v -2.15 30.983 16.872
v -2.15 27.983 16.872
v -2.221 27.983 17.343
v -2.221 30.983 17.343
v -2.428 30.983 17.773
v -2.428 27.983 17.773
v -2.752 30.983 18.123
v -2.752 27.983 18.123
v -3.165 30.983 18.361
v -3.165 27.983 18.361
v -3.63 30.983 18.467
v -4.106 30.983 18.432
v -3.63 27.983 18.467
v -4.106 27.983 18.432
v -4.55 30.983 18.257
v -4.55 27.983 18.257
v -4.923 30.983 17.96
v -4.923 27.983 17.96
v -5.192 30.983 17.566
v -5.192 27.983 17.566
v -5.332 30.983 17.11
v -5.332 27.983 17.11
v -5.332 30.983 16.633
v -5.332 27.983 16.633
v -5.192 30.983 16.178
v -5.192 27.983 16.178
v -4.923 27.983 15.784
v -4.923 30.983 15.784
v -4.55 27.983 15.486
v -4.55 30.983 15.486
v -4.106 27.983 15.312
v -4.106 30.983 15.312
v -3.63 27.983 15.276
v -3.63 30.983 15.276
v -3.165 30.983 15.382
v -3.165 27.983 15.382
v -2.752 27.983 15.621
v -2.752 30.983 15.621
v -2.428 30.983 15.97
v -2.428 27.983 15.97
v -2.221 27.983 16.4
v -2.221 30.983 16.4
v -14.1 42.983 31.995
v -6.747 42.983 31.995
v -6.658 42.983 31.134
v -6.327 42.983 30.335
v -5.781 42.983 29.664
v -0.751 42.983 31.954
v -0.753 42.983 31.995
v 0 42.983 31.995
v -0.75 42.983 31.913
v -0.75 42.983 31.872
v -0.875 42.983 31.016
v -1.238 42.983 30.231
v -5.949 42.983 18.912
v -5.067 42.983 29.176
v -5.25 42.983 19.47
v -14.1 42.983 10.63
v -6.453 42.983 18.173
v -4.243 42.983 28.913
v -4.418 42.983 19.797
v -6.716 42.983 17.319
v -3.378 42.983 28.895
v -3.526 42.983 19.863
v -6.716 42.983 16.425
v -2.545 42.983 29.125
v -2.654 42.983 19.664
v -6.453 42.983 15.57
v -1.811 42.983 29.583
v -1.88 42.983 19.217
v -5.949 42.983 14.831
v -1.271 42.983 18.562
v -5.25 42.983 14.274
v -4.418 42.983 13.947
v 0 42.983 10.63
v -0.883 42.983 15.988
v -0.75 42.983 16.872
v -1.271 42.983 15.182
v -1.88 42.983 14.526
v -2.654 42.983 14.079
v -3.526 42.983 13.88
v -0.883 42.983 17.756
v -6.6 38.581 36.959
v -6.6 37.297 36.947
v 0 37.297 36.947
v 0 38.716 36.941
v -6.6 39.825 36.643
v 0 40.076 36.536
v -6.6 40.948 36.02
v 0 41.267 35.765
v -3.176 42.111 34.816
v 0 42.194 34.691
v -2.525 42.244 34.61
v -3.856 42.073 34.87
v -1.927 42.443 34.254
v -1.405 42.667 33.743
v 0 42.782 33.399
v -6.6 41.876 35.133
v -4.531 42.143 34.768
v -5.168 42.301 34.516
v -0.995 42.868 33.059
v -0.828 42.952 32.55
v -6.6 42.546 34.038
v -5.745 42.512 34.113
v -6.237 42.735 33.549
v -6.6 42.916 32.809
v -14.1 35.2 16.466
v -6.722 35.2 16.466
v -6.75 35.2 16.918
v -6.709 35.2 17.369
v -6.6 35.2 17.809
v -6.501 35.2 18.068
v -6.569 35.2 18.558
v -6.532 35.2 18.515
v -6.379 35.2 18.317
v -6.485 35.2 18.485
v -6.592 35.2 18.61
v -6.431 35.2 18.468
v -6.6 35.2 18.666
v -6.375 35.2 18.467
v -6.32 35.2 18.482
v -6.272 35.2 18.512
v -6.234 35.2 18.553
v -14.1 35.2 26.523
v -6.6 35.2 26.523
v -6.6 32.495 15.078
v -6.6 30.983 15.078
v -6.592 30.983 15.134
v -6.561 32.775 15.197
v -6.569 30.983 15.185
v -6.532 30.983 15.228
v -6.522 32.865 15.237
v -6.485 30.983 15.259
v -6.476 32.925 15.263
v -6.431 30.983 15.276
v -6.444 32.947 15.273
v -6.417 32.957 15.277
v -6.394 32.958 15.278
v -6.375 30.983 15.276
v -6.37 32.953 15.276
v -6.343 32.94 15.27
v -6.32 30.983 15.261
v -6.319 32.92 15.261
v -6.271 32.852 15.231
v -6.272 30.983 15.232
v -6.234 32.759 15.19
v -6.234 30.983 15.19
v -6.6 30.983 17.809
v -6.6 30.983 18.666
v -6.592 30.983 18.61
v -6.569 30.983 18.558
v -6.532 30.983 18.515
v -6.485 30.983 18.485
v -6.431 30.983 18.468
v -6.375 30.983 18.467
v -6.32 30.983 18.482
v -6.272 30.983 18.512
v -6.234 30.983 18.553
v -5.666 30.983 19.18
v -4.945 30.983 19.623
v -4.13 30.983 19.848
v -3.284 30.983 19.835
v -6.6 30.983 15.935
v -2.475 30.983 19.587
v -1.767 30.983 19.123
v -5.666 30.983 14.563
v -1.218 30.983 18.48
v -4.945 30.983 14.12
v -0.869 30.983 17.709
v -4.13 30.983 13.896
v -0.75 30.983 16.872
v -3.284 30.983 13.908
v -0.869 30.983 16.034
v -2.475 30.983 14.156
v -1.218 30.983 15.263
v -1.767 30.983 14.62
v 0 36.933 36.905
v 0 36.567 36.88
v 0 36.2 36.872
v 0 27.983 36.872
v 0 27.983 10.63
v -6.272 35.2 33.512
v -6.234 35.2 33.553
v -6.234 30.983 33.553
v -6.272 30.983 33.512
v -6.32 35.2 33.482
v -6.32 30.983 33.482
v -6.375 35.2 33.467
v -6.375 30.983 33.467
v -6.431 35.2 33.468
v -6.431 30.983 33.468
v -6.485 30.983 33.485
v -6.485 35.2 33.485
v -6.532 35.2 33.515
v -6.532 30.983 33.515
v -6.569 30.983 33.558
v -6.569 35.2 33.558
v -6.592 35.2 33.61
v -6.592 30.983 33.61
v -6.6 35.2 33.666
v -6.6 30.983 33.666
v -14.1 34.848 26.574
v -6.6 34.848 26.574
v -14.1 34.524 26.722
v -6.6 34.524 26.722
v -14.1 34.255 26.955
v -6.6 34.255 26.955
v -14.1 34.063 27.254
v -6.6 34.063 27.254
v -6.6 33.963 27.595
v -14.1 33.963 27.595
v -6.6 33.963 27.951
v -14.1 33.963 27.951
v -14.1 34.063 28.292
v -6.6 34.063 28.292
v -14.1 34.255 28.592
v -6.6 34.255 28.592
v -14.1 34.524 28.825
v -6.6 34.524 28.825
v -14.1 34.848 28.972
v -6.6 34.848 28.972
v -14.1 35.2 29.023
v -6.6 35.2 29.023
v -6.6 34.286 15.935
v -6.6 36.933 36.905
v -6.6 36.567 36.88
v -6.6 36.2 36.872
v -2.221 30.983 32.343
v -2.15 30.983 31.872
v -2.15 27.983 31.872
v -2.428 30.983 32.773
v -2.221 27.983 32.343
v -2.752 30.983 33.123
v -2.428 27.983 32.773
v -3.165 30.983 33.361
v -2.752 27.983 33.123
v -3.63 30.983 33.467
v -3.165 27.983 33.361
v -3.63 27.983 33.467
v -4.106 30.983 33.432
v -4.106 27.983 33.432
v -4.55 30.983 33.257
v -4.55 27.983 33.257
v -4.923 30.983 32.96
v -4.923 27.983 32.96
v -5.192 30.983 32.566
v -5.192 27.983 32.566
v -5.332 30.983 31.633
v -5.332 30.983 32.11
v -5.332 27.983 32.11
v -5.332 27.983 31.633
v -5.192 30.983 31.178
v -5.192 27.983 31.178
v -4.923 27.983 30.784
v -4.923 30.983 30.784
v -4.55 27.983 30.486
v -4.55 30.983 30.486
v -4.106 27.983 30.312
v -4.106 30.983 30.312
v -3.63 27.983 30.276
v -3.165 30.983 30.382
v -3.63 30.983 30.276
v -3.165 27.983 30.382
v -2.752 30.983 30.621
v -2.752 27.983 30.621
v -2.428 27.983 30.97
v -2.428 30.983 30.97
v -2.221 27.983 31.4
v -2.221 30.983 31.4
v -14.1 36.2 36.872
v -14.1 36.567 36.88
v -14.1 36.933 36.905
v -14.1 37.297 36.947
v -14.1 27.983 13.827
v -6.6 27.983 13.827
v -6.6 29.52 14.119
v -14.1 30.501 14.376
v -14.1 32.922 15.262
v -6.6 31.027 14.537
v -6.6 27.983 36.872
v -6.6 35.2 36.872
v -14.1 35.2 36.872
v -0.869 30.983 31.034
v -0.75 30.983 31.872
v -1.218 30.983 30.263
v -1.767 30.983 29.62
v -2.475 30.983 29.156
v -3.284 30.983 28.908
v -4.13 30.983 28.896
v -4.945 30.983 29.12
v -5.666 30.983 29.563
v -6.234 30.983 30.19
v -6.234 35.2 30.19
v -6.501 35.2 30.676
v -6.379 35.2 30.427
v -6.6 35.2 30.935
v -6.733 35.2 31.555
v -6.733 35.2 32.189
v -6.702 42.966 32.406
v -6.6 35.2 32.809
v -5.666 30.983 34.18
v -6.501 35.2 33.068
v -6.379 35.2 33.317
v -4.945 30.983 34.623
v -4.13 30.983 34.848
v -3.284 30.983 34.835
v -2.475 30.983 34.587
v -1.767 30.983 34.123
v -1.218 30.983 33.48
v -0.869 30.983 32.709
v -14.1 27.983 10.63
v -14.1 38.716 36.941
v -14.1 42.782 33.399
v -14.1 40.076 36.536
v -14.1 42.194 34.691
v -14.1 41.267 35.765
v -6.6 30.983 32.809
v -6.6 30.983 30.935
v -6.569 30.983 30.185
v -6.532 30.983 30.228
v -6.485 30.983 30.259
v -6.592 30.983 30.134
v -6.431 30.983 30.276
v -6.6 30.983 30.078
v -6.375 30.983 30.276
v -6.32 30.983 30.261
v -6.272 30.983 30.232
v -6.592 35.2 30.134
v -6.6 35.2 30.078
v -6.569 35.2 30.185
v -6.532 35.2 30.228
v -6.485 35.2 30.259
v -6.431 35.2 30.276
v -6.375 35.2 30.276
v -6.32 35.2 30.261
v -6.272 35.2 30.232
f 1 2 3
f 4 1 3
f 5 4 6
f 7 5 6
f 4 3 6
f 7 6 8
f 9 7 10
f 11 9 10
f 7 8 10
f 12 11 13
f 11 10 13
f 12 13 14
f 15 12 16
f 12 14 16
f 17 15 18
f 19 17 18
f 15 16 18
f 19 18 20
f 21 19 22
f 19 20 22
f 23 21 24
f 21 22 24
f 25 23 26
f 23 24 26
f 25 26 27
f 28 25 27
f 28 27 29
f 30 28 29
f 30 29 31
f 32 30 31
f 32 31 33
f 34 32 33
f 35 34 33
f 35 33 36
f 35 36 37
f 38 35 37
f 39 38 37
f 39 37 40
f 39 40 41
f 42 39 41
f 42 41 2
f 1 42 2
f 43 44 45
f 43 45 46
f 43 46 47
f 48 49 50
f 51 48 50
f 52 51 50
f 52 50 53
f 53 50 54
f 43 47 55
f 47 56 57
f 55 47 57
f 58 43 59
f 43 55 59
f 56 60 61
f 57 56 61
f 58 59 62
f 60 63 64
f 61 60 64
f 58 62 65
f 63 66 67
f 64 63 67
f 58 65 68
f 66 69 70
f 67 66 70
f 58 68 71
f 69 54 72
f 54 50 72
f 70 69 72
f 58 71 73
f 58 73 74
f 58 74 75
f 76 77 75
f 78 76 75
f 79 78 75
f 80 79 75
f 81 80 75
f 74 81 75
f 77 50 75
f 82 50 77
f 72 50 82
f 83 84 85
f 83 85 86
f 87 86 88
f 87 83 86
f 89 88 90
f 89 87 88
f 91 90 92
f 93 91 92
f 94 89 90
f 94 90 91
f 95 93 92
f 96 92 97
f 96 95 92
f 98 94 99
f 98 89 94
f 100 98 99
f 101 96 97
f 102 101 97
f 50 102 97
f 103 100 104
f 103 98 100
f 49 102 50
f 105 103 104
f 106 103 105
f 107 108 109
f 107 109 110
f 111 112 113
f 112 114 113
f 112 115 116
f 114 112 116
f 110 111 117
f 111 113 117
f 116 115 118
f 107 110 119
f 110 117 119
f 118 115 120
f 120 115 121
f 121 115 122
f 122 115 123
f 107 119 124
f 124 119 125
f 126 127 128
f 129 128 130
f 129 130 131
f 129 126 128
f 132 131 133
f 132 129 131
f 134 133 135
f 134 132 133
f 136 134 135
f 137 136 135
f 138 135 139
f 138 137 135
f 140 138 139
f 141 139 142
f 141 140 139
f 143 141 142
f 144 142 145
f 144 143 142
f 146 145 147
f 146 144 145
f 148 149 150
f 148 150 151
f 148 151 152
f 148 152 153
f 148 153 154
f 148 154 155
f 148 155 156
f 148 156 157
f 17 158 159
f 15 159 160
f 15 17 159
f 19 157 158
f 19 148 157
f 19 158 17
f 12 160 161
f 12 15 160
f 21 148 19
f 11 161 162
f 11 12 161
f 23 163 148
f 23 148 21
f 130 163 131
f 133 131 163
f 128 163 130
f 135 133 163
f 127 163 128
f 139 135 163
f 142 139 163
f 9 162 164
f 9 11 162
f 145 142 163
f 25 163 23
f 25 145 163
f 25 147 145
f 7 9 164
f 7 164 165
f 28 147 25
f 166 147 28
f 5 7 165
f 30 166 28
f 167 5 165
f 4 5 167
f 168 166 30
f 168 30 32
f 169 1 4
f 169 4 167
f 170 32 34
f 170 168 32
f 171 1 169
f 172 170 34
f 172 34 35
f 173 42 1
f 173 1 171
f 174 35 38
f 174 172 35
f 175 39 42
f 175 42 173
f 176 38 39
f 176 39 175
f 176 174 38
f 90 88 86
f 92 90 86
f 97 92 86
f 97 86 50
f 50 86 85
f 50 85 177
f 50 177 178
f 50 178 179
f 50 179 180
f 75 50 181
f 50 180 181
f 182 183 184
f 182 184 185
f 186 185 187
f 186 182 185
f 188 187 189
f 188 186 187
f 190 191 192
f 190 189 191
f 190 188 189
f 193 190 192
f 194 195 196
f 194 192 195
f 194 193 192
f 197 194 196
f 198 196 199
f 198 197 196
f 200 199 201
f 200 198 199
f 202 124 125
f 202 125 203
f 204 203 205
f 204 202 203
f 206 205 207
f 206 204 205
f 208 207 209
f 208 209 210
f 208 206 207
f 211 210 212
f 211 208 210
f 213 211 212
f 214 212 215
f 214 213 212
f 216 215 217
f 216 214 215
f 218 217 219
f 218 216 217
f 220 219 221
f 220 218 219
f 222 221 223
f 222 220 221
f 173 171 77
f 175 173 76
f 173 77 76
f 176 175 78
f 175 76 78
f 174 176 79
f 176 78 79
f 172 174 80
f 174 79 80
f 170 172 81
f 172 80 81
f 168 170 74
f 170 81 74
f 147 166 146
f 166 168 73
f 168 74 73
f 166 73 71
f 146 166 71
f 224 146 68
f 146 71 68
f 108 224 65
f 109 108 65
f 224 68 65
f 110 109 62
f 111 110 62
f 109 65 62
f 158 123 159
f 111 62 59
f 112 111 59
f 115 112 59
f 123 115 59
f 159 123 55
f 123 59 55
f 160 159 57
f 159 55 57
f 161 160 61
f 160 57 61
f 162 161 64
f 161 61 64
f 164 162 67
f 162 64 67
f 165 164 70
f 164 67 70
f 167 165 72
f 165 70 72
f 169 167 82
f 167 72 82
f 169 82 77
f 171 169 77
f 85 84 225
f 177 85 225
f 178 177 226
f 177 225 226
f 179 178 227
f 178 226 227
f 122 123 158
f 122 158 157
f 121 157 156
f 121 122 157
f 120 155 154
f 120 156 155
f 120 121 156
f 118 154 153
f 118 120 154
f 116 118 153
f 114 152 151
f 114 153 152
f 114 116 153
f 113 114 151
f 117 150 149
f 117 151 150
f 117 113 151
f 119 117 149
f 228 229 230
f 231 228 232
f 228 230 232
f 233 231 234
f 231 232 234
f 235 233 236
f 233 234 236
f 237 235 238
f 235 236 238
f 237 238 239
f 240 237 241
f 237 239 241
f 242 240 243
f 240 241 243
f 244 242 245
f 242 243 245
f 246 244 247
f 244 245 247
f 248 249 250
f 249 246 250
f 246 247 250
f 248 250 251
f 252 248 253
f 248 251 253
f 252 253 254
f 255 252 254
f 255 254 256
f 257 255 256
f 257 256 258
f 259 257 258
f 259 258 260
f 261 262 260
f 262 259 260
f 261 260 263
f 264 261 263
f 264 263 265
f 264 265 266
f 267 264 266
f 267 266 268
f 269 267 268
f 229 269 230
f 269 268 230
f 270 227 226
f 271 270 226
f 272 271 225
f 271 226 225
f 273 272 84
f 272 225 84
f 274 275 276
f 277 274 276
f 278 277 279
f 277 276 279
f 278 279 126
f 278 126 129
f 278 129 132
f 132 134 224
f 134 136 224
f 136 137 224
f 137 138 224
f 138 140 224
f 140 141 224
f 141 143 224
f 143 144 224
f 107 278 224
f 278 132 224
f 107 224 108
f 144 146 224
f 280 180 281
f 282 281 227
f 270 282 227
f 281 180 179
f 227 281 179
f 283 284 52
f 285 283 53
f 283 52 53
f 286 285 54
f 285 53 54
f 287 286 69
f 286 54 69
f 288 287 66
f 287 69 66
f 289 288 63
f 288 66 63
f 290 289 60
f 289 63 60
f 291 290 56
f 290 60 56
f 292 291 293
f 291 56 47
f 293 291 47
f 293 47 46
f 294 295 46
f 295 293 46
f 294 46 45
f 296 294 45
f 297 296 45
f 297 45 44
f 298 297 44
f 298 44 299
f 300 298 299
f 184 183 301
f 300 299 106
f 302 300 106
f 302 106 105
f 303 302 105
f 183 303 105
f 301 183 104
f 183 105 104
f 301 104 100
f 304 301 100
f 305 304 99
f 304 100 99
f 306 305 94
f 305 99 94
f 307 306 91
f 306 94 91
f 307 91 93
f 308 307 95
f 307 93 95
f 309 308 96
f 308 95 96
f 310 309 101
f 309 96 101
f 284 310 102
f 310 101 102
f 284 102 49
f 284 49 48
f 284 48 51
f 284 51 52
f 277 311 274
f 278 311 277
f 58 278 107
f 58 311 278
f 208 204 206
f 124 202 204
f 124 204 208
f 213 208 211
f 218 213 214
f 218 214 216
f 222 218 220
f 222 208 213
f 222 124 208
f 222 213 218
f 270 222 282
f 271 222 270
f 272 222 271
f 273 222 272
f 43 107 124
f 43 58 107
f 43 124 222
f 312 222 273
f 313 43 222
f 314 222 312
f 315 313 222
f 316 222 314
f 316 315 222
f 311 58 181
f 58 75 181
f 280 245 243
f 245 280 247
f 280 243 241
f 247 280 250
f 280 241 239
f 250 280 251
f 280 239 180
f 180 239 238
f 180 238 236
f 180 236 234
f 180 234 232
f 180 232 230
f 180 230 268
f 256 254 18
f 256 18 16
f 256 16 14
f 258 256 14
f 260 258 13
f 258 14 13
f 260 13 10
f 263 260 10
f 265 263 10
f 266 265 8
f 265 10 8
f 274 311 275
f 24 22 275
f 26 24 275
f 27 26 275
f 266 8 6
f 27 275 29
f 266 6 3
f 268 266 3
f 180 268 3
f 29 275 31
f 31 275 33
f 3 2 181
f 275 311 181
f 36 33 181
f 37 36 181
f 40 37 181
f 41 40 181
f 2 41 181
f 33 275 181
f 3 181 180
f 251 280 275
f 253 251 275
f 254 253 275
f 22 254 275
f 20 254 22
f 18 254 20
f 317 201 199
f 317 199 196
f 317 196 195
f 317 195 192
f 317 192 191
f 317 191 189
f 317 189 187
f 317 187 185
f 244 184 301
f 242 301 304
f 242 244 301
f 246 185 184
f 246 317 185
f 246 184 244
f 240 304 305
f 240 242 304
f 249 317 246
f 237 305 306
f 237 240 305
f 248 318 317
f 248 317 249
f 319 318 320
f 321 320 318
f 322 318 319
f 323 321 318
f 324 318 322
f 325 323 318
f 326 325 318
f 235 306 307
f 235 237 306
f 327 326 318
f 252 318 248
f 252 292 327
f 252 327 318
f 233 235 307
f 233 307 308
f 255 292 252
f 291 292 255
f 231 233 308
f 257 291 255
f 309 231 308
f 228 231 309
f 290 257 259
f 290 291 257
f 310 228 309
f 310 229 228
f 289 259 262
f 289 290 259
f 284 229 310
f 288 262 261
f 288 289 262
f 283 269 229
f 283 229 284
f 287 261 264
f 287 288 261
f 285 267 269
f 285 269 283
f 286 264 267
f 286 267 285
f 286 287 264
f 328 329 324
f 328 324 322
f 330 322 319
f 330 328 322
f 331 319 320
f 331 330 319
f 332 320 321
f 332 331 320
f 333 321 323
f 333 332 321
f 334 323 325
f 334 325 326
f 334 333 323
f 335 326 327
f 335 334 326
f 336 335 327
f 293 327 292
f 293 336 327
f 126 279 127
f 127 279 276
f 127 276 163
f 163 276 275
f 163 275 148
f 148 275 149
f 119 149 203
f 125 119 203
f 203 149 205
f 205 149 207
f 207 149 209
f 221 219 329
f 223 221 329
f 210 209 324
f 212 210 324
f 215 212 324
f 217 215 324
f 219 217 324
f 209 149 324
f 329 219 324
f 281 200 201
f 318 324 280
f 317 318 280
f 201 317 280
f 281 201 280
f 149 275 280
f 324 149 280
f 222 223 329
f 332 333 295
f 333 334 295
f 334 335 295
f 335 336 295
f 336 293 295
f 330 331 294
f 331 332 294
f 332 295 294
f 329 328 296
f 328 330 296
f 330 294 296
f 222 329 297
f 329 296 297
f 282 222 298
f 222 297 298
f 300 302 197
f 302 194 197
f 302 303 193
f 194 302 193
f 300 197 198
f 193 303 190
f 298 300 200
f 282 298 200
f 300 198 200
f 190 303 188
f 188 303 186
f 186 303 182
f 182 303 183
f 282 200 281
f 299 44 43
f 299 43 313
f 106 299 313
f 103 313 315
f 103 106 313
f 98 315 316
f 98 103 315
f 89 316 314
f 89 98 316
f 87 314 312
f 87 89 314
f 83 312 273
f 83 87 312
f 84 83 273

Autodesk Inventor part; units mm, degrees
ref_plane "YZ Plane" through (0, 0, 0) normal (1, 0, 0) x (0, 1, 0)
ref_plane "XZ Plane" through (0, 0, 0) normal (0, 1, 0) x (-1, 0, 0)
sketch "スケッチ1" plane through (0, 0, 0) normal (1, 0, 0) x (0, 1, 0)
  circle A0 centre (10, 5.37) radius 1.6
  circle A1 centre (10, -5.37) radius 1.6
  circle A2 centre (-10, -5.37) radius 1.6
  circle A3 centre (-10, 5.37) radius 1.6
  line L0 (-19.6, 0) -> (19.6, 0) projected
  line L1 (0, -13.118) -> (0, 13.118) projected
  line L2 (14, 9.37) -> (-14, 9.37)
  line L3 (-14, 9.37) -> (-14, -9.37)
  line L4 (-14, -9.37) -> (14, -9.37)
  line L5 (14, -9.37) -> (14, 9.37)
  point P0 (0, 0)
  dimension "d0" = 3.2
  dimension "d1" = 20
  dimension "d2" = 10.74
  dimension "d3" = 4
  dimension "d4" = 4
extrude "押し出し1" add sketch "スケッチ1" against normal blind 2
sketch "スケッチ2" plane through (0, 0, 0) normal (1, 0, 0) x (0, 0, -1)
  line L0 (9.37, 15.2) -> (-40.63, 15.2)
  line L1 (-40.63, 15.2) -> (-40.63, 0.2)
  line L2 (-40.63, 0.2) -> (9.37, 0.2)
  line L3 (9.37, 0.2) -> (9.37, 15.2)
  line L4 (9.37, -14) -> (9.37, 14) projected
  line L5 (9.37, 14) -> (-9.37, 14) projected
  circle A0 centre (-5.37, 10) radius 1.6 projected
  circle A1 centre (5.37, 10) radius 1.6 projected
  point P0 (0, 0)
  dimension "d7" = 1.2
  dimension "d8" = 50
  dimension "d9" = 15
extrude "押し出し2" add sketch "スケッチ2" against normal blind 6.6
sketch "スケッチ3" plane through (0, 15.2, 40.63) normal (0, 1, 0) x (1, 0, 0)
  line L0 (-6.6, 50) -> (-6.6, 0) projected
  line L1 (-6.6, 0) -> (0, 0)
  line L2 (0, 0) -> (0, 30)
  line L3 (0, 30) -> (-6.6, 30)
  line L4 (-6.6, 30) -> (-6.6, 0)
  line L5 (0, 50) -> (0, 0) projected
  point P0 (0, 40.63)
  dimension "d12" = 30
extrude "押し出し3" add sketch "スケッチ3" along normal blind 28
sketch "スケッチ4" plane through (-6.6, 0, 0) normal (-1, 0, 0) x (0, 0, 1)
  circle A0 centre (47.7718, 36.9277) radius 1.4 projected
  circle A1 centre (58.3718, 25.2) radius 1.4 projected
  circle A2 centre (55.0223, 40.3086) radius 1.4 projected
  circle A3 centre (50.3718, 25.2) radius 1.4 projected
  circle A4 centre (47.7718, 13.4723) radius 1.4 projected
  circle A5 centre (55.0223, 10.0914) radius 1.4 projected
  arc A6 (29.2731, 15.2) -> (26.2731, 15.2) centre (27.7731, 15.2) ccw projected
  line L0 (26.2731, 15.2) -> (16.4663, 15.2) projected
  arc A7 (16.4663, 35.2) -> (16.4663, 15.2) centre (32.6218, 25.2) ccw projected
  line L1 (16.4663, 35.2) -> (26.2731, 35.2) projected
  arc A8 (26.2731, 35.2) -> (29.2731, 35.2) centre (27.7731, 35.2) ccw projected
  line L2 (29.2731, 35.2) -> (36.8718, 35.2) projected
  line L3 (36.8718, 35.2) -> (36.8718, 36.2) projected
  arc A9 (44.8718, 44.2) -> (36.8718, 36.2) centre (44.8718, 36.2) ccw projected
  line L4 (44.8718, 44.2) -> (57.5369, 44.2) projected
  arc A10 (57.5369, 6.2) -> (57.5369, 44.2) centre (22.6218, 25.2) ccw projected
  line L5 (57.5369, 6.2) -> (44.8718, 6.2) projected
  arc A11 (36.8718, 14.2) -> (44.8718, 6.2) centre (44.8718, 14.2) ccw projected
  line L6 (36.8718, 14.2) -> (36.8718, 15.2) projected
  line L7 (36.8718, 15.2) -> (29.2731, 15.2) projected
  line L8 (-9.37, 0.2) -> (40.63, 0.2) projected
  line L9 (40.63, 0.2) -> (40.63, 43.2) projected
  line L10 (10.63, 43.2) -> (40.63, 43.2) projected
  line L11 (10.63, 15.2) -> (10.63, 43.2) projected
  line L12 (10.63, 15.2) -> (-9.37, 15.2) projected
  line L13 (-9.37, 15.2) -> (-9.37, 0.2) projected
  circle A12 centre (-5.37, 10) radius 1.6 projected
  circle A13 centre (5.37, 10) radius 1.6 projected
  line L14 (10.63, 15.2) -> (10.63, 0.2)
  line L15 (40.63, 42.9829) -> (10.63, 42.9829)
  point P0 (0, 0)
  point P1 (40.63, 7.4171)
extrude "押し出し4" add sketch "スケッチ4" along normal blind 7.5 contours L7 L6 A11 L9 L8 L14 L11 L15 A9 L3 L2 A8 L1 A7 L0 A6
sketch "スケッチ5" plane through (-14.1, 0, 0) normal (-1, 0, 0) x (0, 0, 1)
  arc A0 (26.2731, 35.2) -> (29.2731, 35.2) centre (27.7731, 35.2) ccw projected
  arc A1 (29.2731, 15.2) -> (26.2731, 15.2) centre (27.7731, 15.2) ccw projected
  circle A2 centre (27.7731, 35.2) radius 1.25
  circle A3 centre (27.7731, 15.2) radius 1.25
  line L0 (26.2731, 35.2) -> (29.2731, 35.2)
  line L1 (29.2731, 15.2) -> (26.2731, 15.2)
  point P0 (0, 0)
  point P1 (26.5231, 15.2)
  point P2 (29.0231, 15.2)
  point P3 (29.0231, 35.2)
  point P4 (26.5231, 35.2)
  dimension "d17" = 2.5
  dimension "d18" = 2.5
extrude "押し出し5" cut sketch "スケッチ5" against normal up to surface (7.5 mm away) contours L0 A2 A0 | L1 A3 A1
sketch "スケッチ6" plane through (-14.1, 0, 0) normal (-1, 0, 0) x (0, 0, 1)
  line L0 (40.63, 0.2) -> (40.63, 7.4171) projected
  line L1 (40.63, 0.2) -> (20.63, 0.2)
  line L2 (20.63, 0.2) -> (20.63, 7.4171)
  line L3 (20.63, 7.4171) -> (40.63, 7.4171)
  line L4 (40.63, 7.4171) -> (40.63, 0.2)
  point P0 (0, 0)
  dimension "d22" = 20
extrude "押し出し6" cut sketch "スケッチ6" against normal through all
fillet "フィレット2" radius 5 2 edges at (-10.35, 42.9829, 40.63) (-10.35, 7.4171, 40.63)
sketch "スケッチ7" plane through (-6.6, 0, 0) normal (-1, 0, 0) x (0, 0, 1)
  arc A0 (36.8718, 14.2) -> (36.9474, 13.1029) centre (44.8718, 14.2) ccw projected
  arc A1 (31.9946, 7.4171) -> (36.9474, 13.1029) centre (31.9946, 12.4171) ccw projected
  line L0 (31.9946, 7.4171) -> (40.63, 7.4171) projected
  line L1 (40.63, 7.4171) -> (40.63, 43.2) projected
  line L2 (10.63, 43.2) -> (40.63, 43.2) projected
  line L3 (10.63, 42.9829) -> (10.63, 43.2) projected
  line L4 (10.63, 42.9829) -> (31.9946, 42.9829) projected
  arc A2 (36.9474, 37.2971) -> (31.9946, 42.9829) centre (31.9946, 37.9829) ccw projected
  arc A3 (36.9474, 37.2971) -> (36.8718, 36.2) centre (44.8718, 36.2) ccw projected
  line L5 (36.8718, 36.2) -> (36.8718, 35.2) projected
  line L6 (36.8718, 35.2) -> (29.0231, 35.2) projected
  arc A4 (26.5231, 35.2) -> (29.0231, 35.2) centre (27.7731, 35.2) ccw projected
  line L7 (26.5231, 35.2) -> (16.4663, 35.2) projected
  arc A5 (16.4663, 35.2) -> (16.4663, 15.2) centre (32.6218, 25.2) ccw projected
  line L8 (16.4663, 15.2) -> (26.5231, 15.2) projected
  arc A6 (29.0231, 15.2) -> (26.5231, 15.2) centre (27.7731, 15.2) ccw projected
  line L9 (29.0231, 15.2) -> (36.8718, 15.2) projected
  line L10 (36.8718, 15.2) -> (36.8718, 14.2) projected
  line L11 (36.8718, 35.2) -> (36.8718, 15.2)
  point P0 (0, 0)
extrude "押し出し7" cut sketch "スケッチ7" against normal through all contours L10 L11 L5 A3 A2 L4 L3 L2 L1 L0 A1 A0
sketch "スケッチ8" plane through (0, 0, 0) normal (1, 0, 0) x (0, 0, -1)
  circle A0 centre (-19.37, 19.55) radius 1.6 projected
  circle A1 centre (-19.37, 19.55) radius 3.5
  point P0 (0, 0)
  dimension "d28" = 7
extrude "押し出し8" cut sketch "スケッチ8" against normal through all contours A0 | A1
ref_plane "作業平面1" through (-14.1, 27.9829, 10.63) normal (0, 1, 0) x (1, 0, 0)
sketch "スケッチ9" plane through (-14.1, 27.9829, 10.63) normal (0, 1, 0) x (1, 0, 0)
  line L0 (42.7294, 46.3445) -> (-18.2888, 46.3445)
  line L1 (-18.2888, 46.3445) -> (-18.2888, -73.0893)
  line L2 (-18.2888, -73.0893) -> (42.7294, -73.0893)
  line L3 (42.7294, -73.0893) -> (42.7294, 46.3445)
  point P0 (14.1, 10.63)
extrude "押し出し9" cut sketch "スケッチ9" against normal through all
sketch "スケッチ10" plane through (-14.1, 27.9829, 10.63) normal (0, -1, 0) x (1, 0, 0)
  circle A0 centre (10.35, 21.2418) radius 1.6 projected
  circle A1 centre (10.35, 6.2418) radius 1.6 projected
  point P0 (14.1, -10.63)
extrude "押し出し10" cut sketch "スケッチ10" against normal through all
sketch "スケッチ11" plane through (-14.1, 42.9829, 10.63) normal (0, 1, 0) x (1, 0, 0)
  circle A0 centre (10.35, -21.2418) radius 1.6 projected
  circle A1 centre (10.35, -6.2418) radius 1.6 projected
  circle A2 centre (10.35, -21.2418) radius 3
  circle A3 centre (10.35, -6.2418) radius 3
  point P0 (14.1, 10.63)
  dimension "d36" = 6
  dimension "d37" = 6
extrude "押し出し11" cut sketch "スケッチ11" against normal blind 12 contours A1 | A2 | A3
fillet "フィレット3" radius 0.2 4 edges at (-6.6, 32.6343, 15.935) (-6.6, 33.0914, 17.8085) (-6.6, 33.0914, 32.8085) (-6.6, 33.0914, 30.935)
equation "\"d4\" = d3"
equation "\"d18\" = d17"
properties part number "cam_setter_right_upper"
